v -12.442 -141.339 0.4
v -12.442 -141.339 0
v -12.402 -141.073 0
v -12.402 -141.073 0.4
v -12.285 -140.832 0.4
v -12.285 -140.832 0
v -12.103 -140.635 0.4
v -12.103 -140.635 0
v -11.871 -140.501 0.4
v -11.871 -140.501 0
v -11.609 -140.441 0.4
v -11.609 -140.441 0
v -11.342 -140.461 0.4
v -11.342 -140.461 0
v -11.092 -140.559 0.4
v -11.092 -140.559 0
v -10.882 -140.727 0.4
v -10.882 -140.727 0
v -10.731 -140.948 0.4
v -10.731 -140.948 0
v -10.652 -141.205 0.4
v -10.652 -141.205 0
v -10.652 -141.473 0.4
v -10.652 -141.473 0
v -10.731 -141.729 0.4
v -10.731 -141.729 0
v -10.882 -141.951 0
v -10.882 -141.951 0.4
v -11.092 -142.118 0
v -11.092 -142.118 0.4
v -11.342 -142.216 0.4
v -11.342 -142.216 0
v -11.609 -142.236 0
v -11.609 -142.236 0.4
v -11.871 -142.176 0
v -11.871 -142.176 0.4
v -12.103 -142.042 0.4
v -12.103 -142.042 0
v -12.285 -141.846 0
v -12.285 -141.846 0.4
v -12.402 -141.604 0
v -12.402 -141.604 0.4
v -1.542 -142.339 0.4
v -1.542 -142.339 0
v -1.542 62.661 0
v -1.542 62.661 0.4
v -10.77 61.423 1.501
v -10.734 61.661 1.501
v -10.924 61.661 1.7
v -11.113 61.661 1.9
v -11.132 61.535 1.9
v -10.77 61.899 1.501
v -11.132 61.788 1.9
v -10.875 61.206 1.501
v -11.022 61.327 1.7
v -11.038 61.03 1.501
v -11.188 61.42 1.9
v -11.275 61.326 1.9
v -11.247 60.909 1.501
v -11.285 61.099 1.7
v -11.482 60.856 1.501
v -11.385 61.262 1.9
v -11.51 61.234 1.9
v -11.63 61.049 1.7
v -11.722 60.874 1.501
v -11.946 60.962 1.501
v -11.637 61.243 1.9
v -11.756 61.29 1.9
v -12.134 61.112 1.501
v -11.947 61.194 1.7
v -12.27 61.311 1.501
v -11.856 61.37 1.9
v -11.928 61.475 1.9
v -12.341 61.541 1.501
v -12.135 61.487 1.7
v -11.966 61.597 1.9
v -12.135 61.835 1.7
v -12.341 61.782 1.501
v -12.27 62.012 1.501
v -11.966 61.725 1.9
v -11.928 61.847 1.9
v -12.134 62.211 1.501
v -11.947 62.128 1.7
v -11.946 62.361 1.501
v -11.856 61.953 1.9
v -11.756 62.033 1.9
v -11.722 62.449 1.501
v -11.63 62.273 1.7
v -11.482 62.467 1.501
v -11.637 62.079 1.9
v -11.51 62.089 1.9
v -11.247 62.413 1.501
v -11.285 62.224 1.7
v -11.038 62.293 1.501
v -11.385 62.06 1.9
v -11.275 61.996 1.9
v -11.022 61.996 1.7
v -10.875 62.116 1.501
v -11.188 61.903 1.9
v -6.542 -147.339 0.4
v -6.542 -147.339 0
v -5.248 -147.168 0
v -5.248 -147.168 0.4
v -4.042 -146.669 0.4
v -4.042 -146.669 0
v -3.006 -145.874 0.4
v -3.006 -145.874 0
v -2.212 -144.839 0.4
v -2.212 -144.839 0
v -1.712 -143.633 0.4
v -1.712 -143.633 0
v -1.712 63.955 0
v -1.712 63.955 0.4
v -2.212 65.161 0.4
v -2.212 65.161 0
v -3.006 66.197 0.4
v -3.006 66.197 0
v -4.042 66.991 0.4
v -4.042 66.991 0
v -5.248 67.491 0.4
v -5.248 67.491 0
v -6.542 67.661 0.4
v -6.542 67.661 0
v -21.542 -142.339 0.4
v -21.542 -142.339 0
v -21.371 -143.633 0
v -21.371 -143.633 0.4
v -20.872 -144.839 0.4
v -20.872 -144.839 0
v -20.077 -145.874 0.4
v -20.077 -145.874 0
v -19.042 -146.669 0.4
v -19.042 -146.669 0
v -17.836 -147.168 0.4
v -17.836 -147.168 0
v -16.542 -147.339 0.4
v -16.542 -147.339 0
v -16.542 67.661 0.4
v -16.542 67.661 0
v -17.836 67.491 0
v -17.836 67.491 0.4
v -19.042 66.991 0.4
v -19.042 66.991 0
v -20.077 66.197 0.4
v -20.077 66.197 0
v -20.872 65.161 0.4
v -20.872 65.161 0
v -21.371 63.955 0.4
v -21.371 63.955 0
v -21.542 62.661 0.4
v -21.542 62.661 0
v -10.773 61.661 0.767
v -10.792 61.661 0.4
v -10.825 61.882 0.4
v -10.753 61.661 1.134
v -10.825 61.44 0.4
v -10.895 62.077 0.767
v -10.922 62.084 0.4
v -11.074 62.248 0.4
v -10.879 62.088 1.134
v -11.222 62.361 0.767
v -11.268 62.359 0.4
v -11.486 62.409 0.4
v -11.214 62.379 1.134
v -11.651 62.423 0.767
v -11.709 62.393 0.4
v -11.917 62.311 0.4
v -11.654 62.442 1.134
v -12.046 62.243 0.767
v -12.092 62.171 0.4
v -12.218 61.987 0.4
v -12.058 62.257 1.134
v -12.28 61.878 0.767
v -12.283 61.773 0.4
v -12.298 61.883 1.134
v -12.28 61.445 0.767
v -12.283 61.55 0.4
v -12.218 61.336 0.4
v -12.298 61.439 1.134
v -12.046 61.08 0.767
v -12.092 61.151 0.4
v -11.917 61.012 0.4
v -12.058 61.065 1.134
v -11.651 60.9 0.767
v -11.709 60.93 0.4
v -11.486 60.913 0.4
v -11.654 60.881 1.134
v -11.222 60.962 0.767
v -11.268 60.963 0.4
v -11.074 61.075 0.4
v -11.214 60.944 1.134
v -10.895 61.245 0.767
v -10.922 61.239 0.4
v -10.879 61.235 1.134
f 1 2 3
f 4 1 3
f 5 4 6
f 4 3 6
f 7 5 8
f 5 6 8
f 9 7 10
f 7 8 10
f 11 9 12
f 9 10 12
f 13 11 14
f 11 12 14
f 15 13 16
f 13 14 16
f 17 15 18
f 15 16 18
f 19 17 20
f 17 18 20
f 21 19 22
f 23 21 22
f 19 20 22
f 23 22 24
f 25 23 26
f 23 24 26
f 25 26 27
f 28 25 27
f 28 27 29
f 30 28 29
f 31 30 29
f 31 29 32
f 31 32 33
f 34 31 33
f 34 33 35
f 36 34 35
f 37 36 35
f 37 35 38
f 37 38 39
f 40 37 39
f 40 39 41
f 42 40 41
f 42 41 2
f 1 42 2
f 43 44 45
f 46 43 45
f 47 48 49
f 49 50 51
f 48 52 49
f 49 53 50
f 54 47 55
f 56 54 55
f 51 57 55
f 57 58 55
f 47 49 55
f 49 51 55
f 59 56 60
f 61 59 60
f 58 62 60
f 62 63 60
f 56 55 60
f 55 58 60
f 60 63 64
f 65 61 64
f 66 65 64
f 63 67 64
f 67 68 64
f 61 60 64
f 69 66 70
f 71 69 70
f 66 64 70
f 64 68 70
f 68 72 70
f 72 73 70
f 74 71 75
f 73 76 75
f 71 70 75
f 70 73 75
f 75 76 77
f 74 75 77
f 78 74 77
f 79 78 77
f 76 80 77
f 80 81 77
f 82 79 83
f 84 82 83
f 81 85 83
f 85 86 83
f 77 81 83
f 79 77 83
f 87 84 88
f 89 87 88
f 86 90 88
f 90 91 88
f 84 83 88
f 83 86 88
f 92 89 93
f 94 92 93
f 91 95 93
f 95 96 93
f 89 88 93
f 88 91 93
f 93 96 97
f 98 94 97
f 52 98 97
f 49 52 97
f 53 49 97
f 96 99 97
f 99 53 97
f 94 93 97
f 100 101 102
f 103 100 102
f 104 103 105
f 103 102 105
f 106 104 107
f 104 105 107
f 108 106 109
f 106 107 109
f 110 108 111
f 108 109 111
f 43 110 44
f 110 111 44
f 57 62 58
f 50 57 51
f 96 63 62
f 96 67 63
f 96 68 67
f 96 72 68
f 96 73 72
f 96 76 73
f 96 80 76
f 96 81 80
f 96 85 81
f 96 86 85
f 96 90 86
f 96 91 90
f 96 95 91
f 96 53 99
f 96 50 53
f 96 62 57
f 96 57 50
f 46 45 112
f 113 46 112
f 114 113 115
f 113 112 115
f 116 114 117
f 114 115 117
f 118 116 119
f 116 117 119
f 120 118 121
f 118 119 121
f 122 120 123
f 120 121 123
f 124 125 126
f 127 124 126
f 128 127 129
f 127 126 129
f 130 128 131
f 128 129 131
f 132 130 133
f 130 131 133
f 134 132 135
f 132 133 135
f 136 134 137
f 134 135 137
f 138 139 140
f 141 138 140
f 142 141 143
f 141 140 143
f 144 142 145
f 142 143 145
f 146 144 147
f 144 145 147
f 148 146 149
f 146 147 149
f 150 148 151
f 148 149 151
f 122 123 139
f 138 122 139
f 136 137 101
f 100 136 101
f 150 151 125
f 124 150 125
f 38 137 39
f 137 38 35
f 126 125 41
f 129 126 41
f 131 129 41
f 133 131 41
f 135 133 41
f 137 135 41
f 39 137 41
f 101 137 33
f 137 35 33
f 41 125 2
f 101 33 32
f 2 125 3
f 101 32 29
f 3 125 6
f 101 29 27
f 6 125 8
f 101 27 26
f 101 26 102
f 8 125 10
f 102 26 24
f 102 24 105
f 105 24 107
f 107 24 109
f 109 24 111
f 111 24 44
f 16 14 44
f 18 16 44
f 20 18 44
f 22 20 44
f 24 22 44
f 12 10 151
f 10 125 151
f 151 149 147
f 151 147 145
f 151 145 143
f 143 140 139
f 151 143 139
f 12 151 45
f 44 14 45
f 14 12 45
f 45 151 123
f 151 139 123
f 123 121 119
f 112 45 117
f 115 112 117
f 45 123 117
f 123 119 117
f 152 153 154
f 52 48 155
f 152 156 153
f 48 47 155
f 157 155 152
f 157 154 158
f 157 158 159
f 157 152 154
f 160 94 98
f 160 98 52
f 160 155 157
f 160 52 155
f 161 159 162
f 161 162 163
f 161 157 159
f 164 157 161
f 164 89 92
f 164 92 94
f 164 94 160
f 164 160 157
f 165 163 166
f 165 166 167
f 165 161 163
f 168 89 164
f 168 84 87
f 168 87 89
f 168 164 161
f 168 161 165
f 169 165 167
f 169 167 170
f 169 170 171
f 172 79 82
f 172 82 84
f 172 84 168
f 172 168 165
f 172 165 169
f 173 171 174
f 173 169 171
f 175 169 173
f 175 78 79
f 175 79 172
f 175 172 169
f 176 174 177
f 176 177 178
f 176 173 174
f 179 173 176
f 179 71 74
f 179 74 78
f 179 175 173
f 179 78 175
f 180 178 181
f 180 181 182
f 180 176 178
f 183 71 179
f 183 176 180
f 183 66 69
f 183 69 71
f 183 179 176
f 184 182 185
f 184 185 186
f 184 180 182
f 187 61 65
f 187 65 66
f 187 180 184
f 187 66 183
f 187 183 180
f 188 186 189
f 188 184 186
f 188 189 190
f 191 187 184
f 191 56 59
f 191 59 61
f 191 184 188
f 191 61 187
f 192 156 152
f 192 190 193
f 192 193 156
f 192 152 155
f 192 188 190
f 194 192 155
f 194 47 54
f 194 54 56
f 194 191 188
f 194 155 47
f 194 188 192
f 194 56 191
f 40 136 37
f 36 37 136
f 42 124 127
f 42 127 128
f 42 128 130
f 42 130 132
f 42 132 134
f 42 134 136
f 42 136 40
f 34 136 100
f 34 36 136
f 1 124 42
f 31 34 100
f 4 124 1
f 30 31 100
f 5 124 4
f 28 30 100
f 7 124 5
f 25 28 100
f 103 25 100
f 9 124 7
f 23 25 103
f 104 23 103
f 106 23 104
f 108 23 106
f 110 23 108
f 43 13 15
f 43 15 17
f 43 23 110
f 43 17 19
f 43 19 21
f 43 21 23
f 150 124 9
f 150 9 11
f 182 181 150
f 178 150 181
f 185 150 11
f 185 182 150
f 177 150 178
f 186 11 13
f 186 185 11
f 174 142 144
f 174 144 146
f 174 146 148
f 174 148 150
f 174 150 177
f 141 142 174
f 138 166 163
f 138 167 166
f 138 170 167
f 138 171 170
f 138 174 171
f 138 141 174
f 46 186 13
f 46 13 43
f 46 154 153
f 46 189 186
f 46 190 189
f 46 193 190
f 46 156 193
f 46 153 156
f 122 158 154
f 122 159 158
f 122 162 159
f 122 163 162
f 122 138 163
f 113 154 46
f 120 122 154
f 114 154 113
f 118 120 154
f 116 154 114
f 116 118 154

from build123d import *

# Parameters (mm, degrees)
F1_DEPTH = 0.4
F2_R     = 0.75
F3_DEPTH = 1.5
F3_TAPER = -3
F5_D     = 1.8


# Not quite as in the source:
# - a fillet or chamfer that OpenCascade refuses, or shapes differently, is made with other operations: its cross-section is extruded or revolved along the edge and cut away or added


with BuildPart() as f1:
    # F0 (on Top) → F1 (new body)
    with BuildSketch(Plane.XY):
        with BuildLine():
            Line((-6.5418671444, 67.6613259315), (-16.5418671444, 67.6613259315))
            ThreePointArc((-16.5418671444, 67.6613259315), (-20.0774010503, 66.1968598375), (-21.5418671444, 62.6613259315))
            Line((-21.5418671444, 62.6613259315), (-21.5418671444, -142.3386740685))
            ThreePointArc((-21.5418671444, -142.3386740685), (-20.0774010503, -145.8742079744), (-16.5418671444, -147.3386740685))
            Line((-16.5418671444, -147.3386740685), (-6.5418671444, -147.3386740685))
            ThreePointArc((-6.5418671444, -147.3386740685), (-3.0063332385, -145.8742079744), (-1.5418671444, -142.3386740685))
            Line((-1.5418671444, -142.3386740685), (-1.5418671444, 62.6613259315))
            ThreePointArc((-1.5418671444, 62.6613259315), (-3.0063332385, 66.1968598375), (-6.5418671444, 67.6613259315))
        make_face()
    extrude(amount=F1_DEPTH)

    # F2 (on face) → F3 (join)
    with BuildSketch(Plane.XY.offset(0.4)):
        with Locations((-11.5418671444, 61.6613259315)):
            Circle(F2_R)
    extrude(amount=F3_DEPTH, taper=F3_TAPER)

    # F4: chamfer of 0.4 on 1 edges, made by hand

    # F4_s1 → F4_t2 (revolve, cut)
    with BuildSketch(Plane.XZ.offset(-61.6613259315)):
        Polygon((-10.734189858, 1.5005481861), (-11.1132554755, 1.9), (-10.7132554755, 1.9), align=None)
    revolve(axis=Axis((-11.5418671444, 61.6613259315, 1.9), (0, 0, -1)), mode=Mode.SUBTRACT)

    # F5 (through all)
    with Locations(Plane.XY.offset(0.4)):
        with Locations((-11.5418671444, -141.3386740685)):
            Hole(F5_D / 2)


solid = f1.part
